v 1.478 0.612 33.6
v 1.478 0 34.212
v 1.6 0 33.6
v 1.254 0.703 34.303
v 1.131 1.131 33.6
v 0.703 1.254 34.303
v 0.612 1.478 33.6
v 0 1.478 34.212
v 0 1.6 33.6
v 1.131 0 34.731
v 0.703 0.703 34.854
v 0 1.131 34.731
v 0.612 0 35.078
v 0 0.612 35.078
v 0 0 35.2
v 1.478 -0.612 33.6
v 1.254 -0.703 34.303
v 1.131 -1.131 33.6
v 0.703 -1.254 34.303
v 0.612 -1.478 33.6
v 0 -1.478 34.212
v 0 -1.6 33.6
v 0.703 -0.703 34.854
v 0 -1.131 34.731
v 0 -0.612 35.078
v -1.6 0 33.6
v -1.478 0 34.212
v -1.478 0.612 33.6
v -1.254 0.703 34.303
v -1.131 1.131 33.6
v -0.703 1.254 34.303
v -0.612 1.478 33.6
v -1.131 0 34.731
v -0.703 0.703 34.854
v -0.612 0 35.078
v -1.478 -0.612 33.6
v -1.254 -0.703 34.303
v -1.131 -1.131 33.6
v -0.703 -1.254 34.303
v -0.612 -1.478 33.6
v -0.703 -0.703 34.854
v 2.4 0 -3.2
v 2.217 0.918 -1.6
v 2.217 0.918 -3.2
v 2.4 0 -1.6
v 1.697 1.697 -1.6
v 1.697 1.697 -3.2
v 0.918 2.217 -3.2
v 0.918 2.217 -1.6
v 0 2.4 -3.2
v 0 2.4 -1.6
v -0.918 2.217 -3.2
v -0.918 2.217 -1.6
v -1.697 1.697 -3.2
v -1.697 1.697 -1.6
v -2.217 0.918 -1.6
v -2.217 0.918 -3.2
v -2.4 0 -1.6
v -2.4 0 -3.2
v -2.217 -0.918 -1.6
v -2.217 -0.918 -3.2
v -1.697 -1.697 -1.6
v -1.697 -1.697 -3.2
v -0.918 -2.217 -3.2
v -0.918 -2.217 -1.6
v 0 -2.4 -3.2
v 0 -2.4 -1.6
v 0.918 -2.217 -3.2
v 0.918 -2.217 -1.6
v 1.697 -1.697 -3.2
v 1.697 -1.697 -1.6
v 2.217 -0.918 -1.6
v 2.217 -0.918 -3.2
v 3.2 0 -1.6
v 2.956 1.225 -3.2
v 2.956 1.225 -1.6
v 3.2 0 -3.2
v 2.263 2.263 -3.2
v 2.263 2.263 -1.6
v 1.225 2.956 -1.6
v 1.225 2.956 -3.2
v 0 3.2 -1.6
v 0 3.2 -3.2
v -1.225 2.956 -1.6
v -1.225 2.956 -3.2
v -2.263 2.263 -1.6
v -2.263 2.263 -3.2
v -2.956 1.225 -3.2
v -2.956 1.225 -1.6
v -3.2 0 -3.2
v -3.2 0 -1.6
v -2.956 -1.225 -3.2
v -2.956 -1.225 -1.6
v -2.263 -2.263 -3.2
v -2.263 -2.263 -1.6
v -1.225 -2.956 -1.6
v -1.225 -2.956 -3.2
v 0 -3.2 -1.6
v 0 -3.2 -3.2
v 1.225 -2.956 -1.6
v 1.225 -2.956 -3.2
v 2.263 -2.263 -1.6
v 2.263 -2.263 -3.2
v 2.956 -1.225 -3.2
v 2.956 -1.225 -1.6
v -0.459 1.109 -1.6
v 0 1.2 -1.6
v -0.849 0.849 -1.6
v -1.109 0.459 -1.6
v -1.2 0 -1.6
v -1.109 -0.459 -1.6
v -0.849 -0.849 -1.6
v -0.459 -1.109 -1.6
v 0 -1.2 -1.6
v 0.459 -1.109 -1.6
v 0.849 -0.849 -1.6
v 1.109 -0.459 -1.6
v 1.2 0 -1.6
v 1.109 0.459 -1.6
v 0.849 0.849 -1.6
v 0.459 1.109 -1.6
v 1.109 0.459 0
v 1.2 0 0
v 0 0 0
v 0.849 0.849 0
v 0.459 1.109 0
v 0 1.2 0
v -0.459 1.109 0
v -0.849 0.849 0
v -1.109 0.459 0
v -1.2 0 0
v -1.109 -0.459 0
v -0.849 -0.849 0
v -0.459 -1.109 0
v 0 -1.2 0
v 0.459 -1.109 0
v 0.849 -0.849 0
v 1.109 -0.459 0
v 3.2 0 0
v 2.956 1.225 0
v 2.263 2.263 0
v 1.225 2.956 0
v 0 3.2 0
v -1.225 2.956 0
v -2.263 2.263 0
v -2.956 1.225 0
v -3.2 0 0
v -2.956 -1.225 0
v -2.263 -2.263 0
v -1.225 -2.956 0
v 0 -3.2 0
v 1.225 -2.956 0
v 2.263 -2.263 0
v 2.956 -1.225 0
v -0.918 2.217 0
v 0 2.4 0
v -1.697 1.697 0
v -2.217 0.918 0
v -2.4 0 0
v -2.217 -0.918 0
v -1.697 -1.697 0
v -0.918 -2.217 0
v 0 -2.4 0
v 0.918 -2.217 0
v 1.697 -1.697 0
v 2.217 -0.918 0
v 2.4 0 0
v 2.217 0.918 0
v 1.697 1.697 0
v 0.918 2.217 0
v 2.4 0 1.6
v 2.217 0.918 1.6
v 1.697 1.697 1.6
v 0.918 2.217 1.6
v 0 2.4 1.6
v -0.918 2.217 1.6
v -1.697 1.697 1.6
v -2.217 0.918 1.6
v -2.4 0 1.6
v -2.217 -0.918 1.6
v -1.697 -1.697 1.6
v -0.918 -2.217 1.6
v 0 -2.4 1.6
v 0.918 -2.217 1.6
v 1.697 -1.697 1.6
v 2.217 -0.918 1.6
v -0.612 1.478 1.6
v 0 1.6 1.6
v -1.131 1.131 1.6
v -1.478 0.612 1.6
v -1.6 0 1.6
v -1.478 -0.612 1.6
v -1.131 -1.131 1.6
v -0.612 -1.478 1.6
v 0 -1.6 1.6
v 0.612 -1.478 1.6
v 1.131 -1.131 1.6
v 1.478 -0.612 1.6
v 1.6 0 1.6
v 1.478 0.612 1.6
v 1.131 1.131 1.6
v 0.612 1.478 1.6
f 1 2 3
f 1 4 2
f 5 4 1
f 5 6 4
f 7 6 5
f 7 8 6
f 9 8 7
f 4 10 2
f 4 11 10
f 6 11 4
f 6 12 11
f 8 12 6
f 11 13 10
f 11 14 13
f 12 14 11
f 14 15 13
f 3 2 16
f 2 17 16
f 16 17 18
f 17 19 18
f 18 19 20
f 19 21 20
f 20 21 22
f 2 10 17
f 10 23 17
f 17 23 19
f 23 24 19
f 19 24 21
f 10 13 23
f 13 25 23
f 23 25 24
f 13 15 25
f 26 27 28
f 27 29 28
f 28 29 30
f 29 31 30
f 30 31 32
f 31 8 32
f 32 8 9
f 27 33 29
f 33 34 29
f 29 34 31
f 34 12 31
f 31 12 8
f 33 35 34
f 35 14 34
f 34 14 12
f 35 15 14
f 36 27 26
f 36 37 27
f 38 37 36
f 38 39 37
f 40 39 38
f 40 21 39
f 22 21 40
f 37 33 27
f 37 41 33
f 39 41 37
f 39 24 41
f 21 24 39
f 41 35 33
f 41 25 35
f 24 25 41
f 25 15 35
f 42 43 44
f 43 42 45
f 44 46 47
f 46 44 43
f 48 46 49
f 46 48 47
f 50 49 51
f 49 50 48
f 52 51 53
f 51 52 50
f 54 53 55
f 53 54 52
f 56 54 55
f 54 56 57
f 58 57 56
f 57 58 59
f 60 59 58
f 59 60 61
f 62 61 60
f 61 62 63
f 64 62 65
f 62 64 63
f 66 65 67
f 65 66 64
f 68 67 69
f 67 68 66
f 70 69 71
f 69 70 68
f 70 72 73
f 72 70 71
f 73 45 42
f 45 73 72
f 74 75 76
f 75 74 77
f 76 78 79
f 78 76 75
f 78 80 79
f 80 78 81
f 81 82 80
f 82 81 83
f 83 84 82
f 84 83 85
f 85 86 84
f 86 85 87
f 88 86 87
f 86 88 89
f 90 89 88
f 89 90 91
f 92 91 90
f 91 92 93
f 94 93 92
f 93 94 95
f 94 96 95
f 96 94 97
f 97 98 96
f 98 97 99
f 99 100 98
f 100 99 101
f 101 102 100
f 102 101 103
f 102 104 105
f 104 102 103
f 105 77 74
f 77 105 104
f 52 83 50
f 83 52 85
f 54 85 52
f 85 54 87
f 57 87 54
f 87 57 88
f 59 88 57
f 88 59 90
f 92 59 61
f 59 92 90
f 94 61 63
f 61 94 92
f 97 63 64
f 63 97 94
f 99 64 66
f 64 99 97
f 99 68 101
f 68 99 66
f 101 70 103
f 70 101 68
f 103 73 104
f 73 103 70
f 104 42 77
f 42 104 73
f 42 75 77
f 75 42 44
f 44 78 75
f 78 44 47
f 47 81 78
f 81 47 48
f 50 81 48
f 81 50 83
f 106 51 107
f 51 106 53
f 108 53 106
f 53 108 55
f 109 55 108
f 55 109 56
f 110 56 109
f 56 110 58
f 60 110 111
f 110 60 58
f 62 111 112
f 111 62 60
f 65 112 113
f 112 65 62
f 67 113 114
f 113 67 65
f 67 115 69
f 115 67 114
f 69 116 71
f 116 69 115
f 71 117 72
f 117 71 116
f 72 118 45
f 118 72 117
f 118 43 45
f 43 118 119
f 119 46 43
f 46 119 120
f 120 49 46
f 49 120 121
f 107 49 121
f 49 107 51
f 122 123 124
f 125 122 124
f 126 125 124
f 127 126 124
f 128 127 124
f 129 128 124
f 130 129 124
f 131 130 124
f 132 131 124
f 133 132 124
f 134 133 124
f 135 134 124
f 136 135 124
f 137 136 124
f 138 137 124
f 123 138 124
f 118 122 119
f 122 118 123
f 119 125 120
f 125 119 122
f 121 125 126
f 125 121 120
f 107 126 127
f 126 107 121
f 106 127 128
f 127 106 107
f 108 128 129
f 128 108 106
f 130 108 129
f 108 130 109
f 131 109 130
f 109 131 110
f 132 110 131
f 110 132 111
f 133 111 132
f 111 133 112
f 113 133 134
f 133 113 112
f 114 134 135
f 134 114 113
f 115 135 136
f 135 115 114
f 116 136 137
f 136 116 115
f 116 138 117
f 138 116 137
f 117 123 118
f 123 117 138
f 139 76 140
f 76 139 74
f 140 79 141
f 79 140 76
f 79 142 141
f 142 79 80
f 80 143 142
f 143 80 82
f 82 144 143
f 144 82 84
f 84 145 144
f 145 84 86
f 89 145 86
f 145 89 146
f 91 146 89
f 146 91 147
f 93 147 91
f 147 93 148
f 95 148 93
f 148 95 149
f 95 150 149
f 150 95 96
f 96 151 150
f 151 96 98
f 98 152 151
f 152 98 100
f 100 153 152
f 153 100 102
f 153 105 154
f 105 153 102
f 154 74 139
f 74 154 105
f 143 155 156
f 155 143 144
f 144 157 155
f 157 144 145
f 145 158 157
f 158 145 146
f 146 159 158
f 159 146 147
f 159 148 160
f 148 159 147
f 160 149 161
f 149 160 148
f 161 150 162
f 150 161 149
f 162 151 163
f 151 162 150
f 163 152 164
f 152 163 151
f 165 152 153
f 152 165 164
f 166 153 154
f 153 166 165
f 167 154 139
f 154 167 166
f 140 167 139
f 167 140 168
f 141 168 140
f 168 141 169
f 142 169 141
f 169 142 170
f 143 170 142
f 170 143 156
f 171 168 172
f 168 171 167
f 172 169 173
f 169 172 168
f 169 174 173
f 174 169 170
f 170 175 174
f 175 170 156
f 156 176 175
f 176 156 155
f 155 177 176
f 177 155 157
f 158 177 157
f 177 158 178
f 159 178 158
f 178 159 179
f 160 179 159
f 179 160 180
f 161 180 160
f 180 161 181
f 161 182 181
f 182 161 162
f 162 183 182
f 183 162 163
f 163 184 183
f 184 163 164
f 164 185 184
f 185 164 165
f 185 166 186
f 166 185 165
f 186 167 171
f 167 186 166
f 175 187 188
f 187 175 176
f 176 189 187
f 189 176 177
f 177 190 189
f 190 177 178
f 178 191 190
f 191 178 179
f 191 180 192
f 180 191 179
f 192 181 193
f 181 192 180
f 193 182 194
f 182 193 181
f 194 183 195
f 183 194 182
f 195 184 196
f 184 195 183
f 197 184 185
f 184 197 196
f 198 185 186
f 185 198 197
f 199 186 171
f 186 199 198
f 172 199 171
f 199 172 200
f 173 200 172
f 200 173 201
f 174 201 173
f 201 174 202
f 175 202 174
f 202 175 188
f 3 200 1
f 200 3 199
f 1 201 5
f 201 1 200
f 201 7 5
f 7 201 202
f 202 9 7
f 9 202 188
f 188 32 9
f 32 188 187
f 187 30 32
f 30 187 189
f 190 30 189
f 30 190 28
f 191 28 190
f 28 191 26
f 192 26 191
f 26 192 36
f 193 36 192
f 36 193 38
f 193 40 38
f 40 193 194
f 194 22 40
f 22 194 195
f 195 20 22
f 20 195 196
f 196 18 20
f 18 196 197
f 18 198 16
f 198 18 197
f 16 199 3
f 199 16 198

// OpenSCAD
// file: ../p/1-8sphe.scad
use <../lib.scad>
function ldraw_lib__1_8sphe() = [
// 0 Sphere 0.125
// 0 Name: 1-8sphe.dat
// 0 Author: James Jessiman
// 0 !LDRAW_ORG Primitive UPDATE 2012-03
// 0 !LICENSE Licensed under CC BY 2.0 and CC BY 4.0 : see CAreadme.txt
// 
// 0 BFC CERTIFY CCW
  [0,"BFC","CERTIFY"],
  [0,"BFC","CCW"],
// 
// 0 !HISTORY 2000-08-01 {Axel Poque} fixes to resolve L3P error messages.
// 0 !HISTORY 2000-08-01 {Manfred Moolhuysen} fixes to resolve L3P error messages.
// 0 !HISTORY 2000-09-30 [PTadmin] Official Update 2000-02
// 0 !HISTORY 2002-03-28 [hafhead] Made BFC compliant
// 0 !HISTORY 2002-04-25 [PTadmin] Official Update 2002-02
// 0 !HISTORY 2007-06-22 [PTadmin] Header formatted for Contributor Agreement
// 0 !HISTORY 2008-07-01 [PTadmin] Official Update 2008-01
// 0 !HISTORY 2010-09-12 [MagFors] Changed winding, removed duplicated cond-line, optimized filesize
// 0 !HISTORY 2010-12-31 [PTadmin] Official Update 2010-03
// 0 !HISTORY 2012-07-01 [tcobbs] Replaced with geometry from LDView
// 0 !HISTORY 2012-12-28 [PTadmin] Official Update 2012-03
// 
// 
// 3 16 1 0 0 0.9239 0.3827 0 0.9239 0 0.3827
  [3,16,1,0,0,0.9239,0.3827,0,0.9239,0,0.3827],
// 3 16 0.9239 0.3827 0 0.7836 0.4393 0.4393 0.9239 0 0.3827
  [3,16,0.9239,0.3827,0,0.7836,0.4393,0.4393,0.9239,0,0.3827],
// 3 16 0.9239 0 0.3827 0.7836 0.4393 0.4393 0.7071 0 0.7071
  [3,16,0.9239,0,0.3827,0.7836,0.4393,0.4393,0.7071,0,0.7071],
// 3 16 0.7836 0.4393 0.4393 0.4393 0.4393 0.7836 0.7071 0 0.7071
  [3,16,0.7836,0.4393,0.4393,0.4393,0.4393,0.7836,0.7071,0,0.7071],
// 3 16 0.7071 0 0.7071 0.4393 0.4393 0.7836 0.3827 0 0.9239
  [3,16,0.7071,0,0.7071,0.4393,0.4393,0.7836,0.3827,0,0.9239],
// 3 16 0.4393 0.4393 0.7836 0 0.3827 0.9239 0.3827 0 0.9239
  [3,16,0.4393,0.4393,0.7836,0,0.3827,0.9239,0.3827,0,0.9239],
// 3 16 0.3827 0 0.9239 0 0.3827 0.9239 0 0 1
  [3,16,0.3827,0,0.9239,0,0.3827,0.9239,0,0,1],
// 3 16 0.9239 0.3827 0 0.7071 0.7071 0 0.7836 0.4393 0.4393
  [3,16,0.9239,0.3827,0,0.7071,0.7071,0,0.7836,0.4393,0.4393],
// 3 16 0.7071 0.7071 0 0.4393 0.7836 0.4393 0.7836 0.4393 0.4393
  [3,16,0.7071,0.7071,0,0.4393,0.7836,0.4393,0.7836,0.4393,0.4393],
// 3 16 0.7836 0.4393 0.4393 0.4393 0.7836 0.4393 0.4393 0.4393 0.7836
  [3,16,0.7836,0.4393,0.4393,0.4393,0.7836,0.4393,0.4393,0.4393,0.7836],
// 3 16 0.4393 0.7836 0.4393 0 0.7071 0.7071 0.4393 0.4393 0.7836
  [3,16,0.4393,0.7836,0.4393,0,0.7071,0.7071,0.4393,0.4393,0.7836],
// 3 16 0.4393 0.4393 0.7836 0 0.7071 0.7071 0 0.3827 0.9239
  [3,16,0.4393,0.4393,0.7836,0,0.7071,0.7071,0,0.3827,0.9239],
// 3 16 0.7071 0.7071 0 0.3827 0.9239 0 0.4393 0.7836 0.4393
  [3,16,0.7071,0.7071,0,0.3827,0.9239,0,0.4393,0.7836,0.4393],
// 3 16 0.3827 0.9239 0 0 0.9239 0.3827 0.4393 0.7836 0.4393
  [3,16,0.3827,0.9239,0,0,0.9239,0.3827,0.4393,0.7836,0.4393],
// 3 16 0.4393 0.7836 0.4393 0 0.9239 0.3827 0 0.7071 0.7071
  [3,16,0.4393,0.7836,0.4393,0,0.9239,0.3827,0,0.7071,0.7071],
// 3 16 0.3827 0.9239 0 0 1 0 0 0.9239 0.3827
  [3,16,0.3827,0.9239,0,0,1,0,0,0.9239,0.3827],
// 
// 5 24 1 0 0 0.9239 0.3827 0 1 0 -0.1 0.9239 0 0.3827
  [5,24,1,0,0,0.9239,0.3827,0,1,0,-0.1,0.9239,0,0.3827],
// 5 24 0.9239 0.3827 0 0.9239 0 0.3827 1 0 0 0.7836 0.4393 0.4393
  [5,24,0.9239,0.3827,0,0.9239,0,0.3827,1,0,0,0.7836,0.4393,0.4393],
// 5 24 1 0 0 0.9239 0 0.3827 0.9239 0.3827 0 1 -0.1 0
  [5,24,1,0,0,0.9239,0,0.3827,0.9239,0.3827,0,1,-0.1,0],
// 5 24 0.9239 0 0.3827 0.7836 0.4393 0.4393 0.9239 0.3827 0 0.7071 0 0.7071
  [5,24,0.9239,0,0.3827,0.7836,0.4393,0.4393,0.9239,0.3827,0,0.7071,0,0.7071],
// 5 24 0.7836 0.4393 0.4393 0.7071 0 0.7071 0.9239 0 0.3827 0.4393 0.4393 0.7836
  [5,24,0.7836,0.4393,0.4393,0.7071,0,0.7071,0.9239,0,0.3827,0.4393,0.4393,0.7836],
// 5 24 0.9239 0 0.3827 0.7071 0 0.7071 0.7836 0.4393 0.4393 0.9239 -0.1 0.3827
  [5,24,0.9239,0,0.3827,0.7071,0,0.7071,0.7836,0.4393,0.4393,0.9239,-0.1,0.3827],
// 5 24 0.7071 0 0.7071 0.4393 0.4393 0.7836 0.7836 0.4393 0.4393 0.3827 0 0.9239
  [5,24,0.7071,0,0.7071,0.4393,0.4393,0.7836,0.7836,0.4393,0.4393,0.3827,0,0.9239],
// 5 24 0.4393 0.4393 0.7836 0.3827 0 0.9239 0.7071 0 0.7071 0 0.3827 0.9239
  [5,24,0.4393,0.4393,0.7836,0.3827,0,0.9239,0.7071,0,0.7071,0,0.3827,0.9239],
// 5 24 0.7071 0 0.7071 0.3827 0 0.9239 0.4393 0.4393 0.7836 0.7071 -0.1 0.7071
  [5,24,0.7071,0,0.7071,0.3827,0,0.9239,0.4393,0.4393,0.7836,0.7071,-0.1,0.7071],
// 5 24 0.3827 0 0.9239 0 0.3827 0.9239 0.4393 0.4393 0.7836 0 0 1
  [5,24,0.3827,0,0.9239,0,0.3827,0.9239,0.4393,0.4393,0.7836,0,0,1],
// 5 24 0 0.3827 0.9239 0 0 1 0.3827 0 0.9239 -0.1 0.3827 0.9239
  [5,24,0,0.3827,0.9239,0,0,1,0.3827,0,0.9239,-0.1,0.3827,0.9239],
// 5 24 0.3827 0 0.9239 0 0 1 0 0.3827 0.9239 0.3827 -0.1 0.9239
  [5,24,0.3827,0,0.9239,0,0,1,0,0.3827,0.9239,0.3827,-0.1,0.9239],
// 5 24 0.9239 0.3827 0 0.7071 0.7071 0 0.9239 0.3827 -0.1 0.7836 0.4393 0.4393
  [5,24,0.9239,0.3827,0,0.7071,0.7071,0,0.9239,0.3827,-0.1,0.7836,0.4393,0.4393],
// 5 24 0.7071 0.7071 0 0.7836 0.4393 0.4393 0.9239 0.3827 0 0.4393 0.7836 0.4393
  [5,24,0.7071,0.7071,0,0.7836,0.4393,0.4393,0.9239,0.3827,0,0.4393,0.7836,0.4393],
// 5 24 0.9239 0.3827 0 0.7836 0.4393 0.4393 0.7071 0.7071 0 0.9239 0 0.3827
  [5,24,0.9239,0.3827,0,0.7836,0.4393,0.4393,0.7071,0.7071,0,0.9239,0,0.3827],
// 5 24 0.7836 0.4393 0.4393 0.4393 0.7836 0.4393 0.7071 0.7071 0 0.4393 0.4393 0.7836
  [5,24,0.7836,0.4393,0.4393,0.4393,0.7836,0.4393,0.7071,0.7071,0,0.4393,0.4393,0.7836],
// 5 24 0.4393 0.7836 0.4393 0.4393 0.4393 0.7836 0.7836 0.4393 0.4393 0 0.7071 0.7071
  [5,24,0.4393,0.7836,0.4393,0.4393,0.4393,0.7836,0.7836,0.4393,0.4393,0,0.7071,0.7071],
// 5 24 0.7836 0.4393 0.4393 0.4393 0.4393 0.7836 0.4393 0.7836 0.4393 0.7071 0 0.7071
  [5,24,0.7836,0.4393,0.4393,0.4393,0.4393,0.7836,0.4393,0.7836,0.4393,0.7071,0,0.7071],
// 5 24 0.4393 0.4393 0.7836 0 0.7071 0.7071 0.4393 0.7836 0.4393 0 0.3827 0.9239
  [5,24,0.4393,0.4393,0.7836,0,0.7071,0.7071,0.4393,0.7836,0.4393,0,0.3827,0.9239],
// 5 24 0 0.7071 0.7071 0 0.3827 0.9239 0.4393 0.4393 0.7836 -0.1 0.7071 0.7071
  [5,24,0,0.7071,0.7071,0,0.3827,0.9239,0.4393,0.4393,0.7836,-0.1,0.7071,0.7071],
// 5 24 0.4393 0.4393 0.7836 0 0.3827 0.9239 0 0.7071 0.7071 0.3827 0 0.9239
  [5,24,0.4393,0.4393,0.7836,0,0.3827,0.9239,0,0.7071,0.7071,0.3827,0,0.9239],
// 5 24 0.7071 0.7071 0 0.3827 0.9239 0 0.7071 0.7071 -0.1 0.4393 0.7836 0.4393
  [5,24,0.7071,0.7071,0,0.3827,0.9239,0,0.7071,0.7071,-0.1,0.4393,0.7836,0.4393],
// 5 24 0.3827 0.9239 0 0.4393 0.7836 0.4393 0.7071 0.7071 0 0 0.9239 0.3827
  [5,24,0.3827,0.9239,0,0.4393,0.7836,0.4393,0.7071,0.7071,0,0,0.9239,0.3827],
// 5 24 0.7071 0.7071 0 0.4393 0.7836 0.4393 0.3827 0.9239 0 0.7836 0.4393 0.4393
  [5,24,0.7071,0.7071,0,0.4393,0.7836,0.4393,0.3827,0.9239,0,0.7836,0.4393,0.4393],
// 5 24 0.4393 0.7836 0.4393 0 0.9239 0.3827 0.3827 0.9239 0 0 0.7071 0.7071
  [5,24,0.4393,0.7836,0.4393,0,0.9239,0.3827,0.3827,0.9239,0,0,0.7071,0.7071],
// 5 24 0 0.9239 0.3827 0 0.7071 0.7071 0.4393 0.7836 0.4393 -0.1 0.9239 0.3827
  [5,24,0,0.9239,0.3827,0,0.7071,0.7071,0.4393,0.7836,0.4393,-0.1,0.9239,0.3827],
// 5 24 0.4393 0.7836 0.4393 0 0.7071 0.7071 0 0.9239 0.3827 0.4393 0.4393 0.7836
  [5,24,0.4393,0.7836,0.4393,0,0.7071,0.7071,0,0.9239,0.3827,0.4393,0.4393,0.7836],
// 5 24 0.3827 0.9239 0 0 1 0 0.3827 0.9239 -0.1 0 0.9239 0.3827
  [5,24,0.3827,0.9239,0,0,1,0,0.3827,0.9239,-0.1,0,0.9239,0.3827],
// 5 24 0 1 0 0 0.9239 0.3827 0.3827 0.9239 0 -0.1 1 0
  [5,24,0,1,0,0,0.9239,0.3827,0.3827,0.9239,0,-0.1,1,0],
// 5 24 0.3827 0.9239 0 0 0.9239 0.3827 0 1 0 0.4393 0.7836 0.4393
  [5,24,0.3827,0.9239,0,0,0.9239,0.3827,0,1,0,0.4393,0.7836,0.4393],
];
makepoly(ldraw_lib__1_8sphe(), line=0.2);
// file: ../p/4-4disc.scad
use <../lib.scad>
function ldraw_lib__4_4disc() = [
// 0 Disc 1.0
// 0 Name: 4-4disc.dat
// 0 Author: James Jessiman
// 0 !LDRAW_ORG Primitive UPDATE 2002-02
// 0 !LICENSE Licensed under CC BY 2.0 and CC BY 4.0 : see CAreadme.txt
// 
// 0 BFC CERTIFY CCW
  [0,"BFC","CERTIFY"],
  [0,"BFC","CCW"],
// 
// 0 !HISTORY 1998-12-15 [PTadmin] Official Update 1998-10
// 0 !HISTORY 2002-03-23 [sbliss] Added BFC statement
// 0 !HISTORY 2002-04-25 [PTadmin] Official Update 2002-02
// 0 !HISTORY 2007-06-24 [PTadmin] Header formatted for Contributor Agreement
// 0 !HISTORY 2008-07-01 [PTadmin] Official Update 2008-01
// 
// 
// 3 16 0 0 0 1 0 0 0.9239 0 0.3827
  [3,16,0,0,0,1,0,0,0.9239,0,0.3827],
// 3 16 0 0 0 0.9239 0 0.3827 0.7071 0 0.7071
  [3,16,0,0,0,0.9239,0,0.3827,0.7071,0,0.7071],
// 3 16 0 0 0 0.7071 0 0.7071 0.3827 0 0.9239
  [3,16,0,0,0,0.7071,0,0.7071,0.3827,0,0.9239],
// 3 16 0 0 0 0.3827 0 0.9239 0 0 1
  [3,16,0,0,0,0.3827,0,0.9239,0,0,1],
// 3 16 0 0 0 0 0 1 -0.3827 0 0.9239
  [3,16,0,0,0,0,0,1,-0.3827,0,0.9239],
// 3 16 0 0 0 -0.3827 0 0.9239 -0.7071 0 0.7071
  [3,16,0,0,0,-0.3827,0,0.9239,-0.7071,0,0.7071],
// 3 16 0 0 0 -0.7071 0 0.7071 -0.9239 0 0.3827
  [3,16,0,0,0,-0.7071,0,0.7071,-0.9239,0,0.3827],
// 3 16 0 0 0 -0.9239 0 0.3827 -1 0 -0
  [3,16,0,0,0,-0.9239,0,0.3827,-1,0,-0],
// 3 16 0 0 0 -1 0 -0 -0.9239 0 -0.3827
  [3,16,0,0,0,-1,0,-0,-0.9239,0,-0.3827],
// 3 16 0 0 0 -0.9239 0 -0.3827 -0.7071 0 -0.7071
  [3,16,0,0,0,-0.9239,0,-0.3827,-0.7071,0,-0.7071],
// 3 16 0 0 0 -0.7071 0 -0.7071 -0.3827 0 -0.9239
  [3,16,0,0,0,-0.7071,0,-0.7071,-0.3827,0,-0.9239],
// 3 16 0 0 0 -0.3827 0 -0.9239 0 0 -1
  [3,16,0,0,0,-0.3827,0,-0.9239,0,0,-1],
// 3 16 0 0 0 0 0 -1 0.3827 0 -0.9239
  [3,16,0,0,0,0,0,-1,0.3827,0,-0.9239],
// 3 16 0 0 0 0.3827 0 -0.9239 0.7071 0 -0.7071
  [3,16,0,0,0,0.3827,0,-0.9239,0.7071,0,-0.7071],
// 3 16 0 0 0 0.7071 0 -0.7071 0.9239 0 -0.3827
  [3,16,0,0,0,0.7071,0,-0.7071,0.9239,0,-0.3827],
// 3 16 0 0 0 0.9239 0 -0.3827 1 0 0
  [3,16,0,0,0,0.9239,0,-0.3827,1,0,0],
// 0
];
makepoly(ldraw_lib__4_4disc(), line=0.2);
// file: ../p/stud4a.scad
use <../lib.scad>
use <4-4cyli.scad>
use <4-4edge.scad>
use <4-4ring3.scad>
function ldraw_lib__stud4a() = [
// 0 Stud Tube Open without Base Edges
// 0 Name: stud4a.dat
// 0 Author: James Jessiman
// 0 !LDRAW_ORG Primitive UPDATE 2009-02
// 0 !LICENSE Licensed under CC BY 2.0 and CC BY 4.0 : see CAreadme.txt
// 
// 0 BFC CERTIFY CCW
  [0,"BFC","CERTIFY"],
  [0,"BFC","CCW"],
// 
// 0 !HISTORY 1999-07-05 [PTadmin] Official Update 1999-05
// 0 !HISTORY 2002-04-04 [sbliss] Modified for BFC compliance
// 0 !HISTORY 2002-04-25 [PTadmin] Official Update 2002-02
// 0 !HISTORY 2007-06-24 [PTadmin] Header formatted for Contributor Agreement
// 0 !HISTORY 2008-07-01 [PTadmin] Official Update 2008-01
// 0 !HISTORY 2009-06-21 [cwdee] Update ring references to 4-4ring
// 0 !HISTORY 2009-09-03 [PTadmin] Official Update 2009-02
// 
// 
// 1 16 0 -4 0 6 0 0 0 1 0 0 0 6 4-4edge.dat
  [1,16,0,-4,0,6,0,0,0,1,0,0,0,6, ldraw_lib__4_4edge()],
// 1 16 0 -4 0 8 0 0 0 1 0 0 0 8 4-4edge.dat
  [1,16,0,-4,0,8,0,0,0,1,0,0,0,8, ldraw_lib__4_4edge()],
// 0 BFC INVERTNEXT
  [0,"BFC","INVERTNEXT"],
// 1 16 0 -4 0 6 0 0 0 4 0 0 0 6 4-4cyli.dat
  [1,16,0,-4,0,6,0,0,0,4,0,0,0,6, ldraw_lib__4_4cyli()],
// 1 16 0 -4 0 8 0 0 0 4 0 0 0 8 4-4cyli.dat
  [1,16,0,-4,0,8,0,0,0,4,0,0,0,8, ldraw_lib__4_4cyli()],
// 1 16 0 -4 0 2 0 0 0 1 0 0 0 2 4-4ring3.dat
  [1,16,0,-4,0,2,0,0,0,1,0,0,0,2, ldraw_lib__4_4ring3()],
// 0
];
makepoly(ldraw_lib__stud4a(), line=0.2);
// file: ../p/4-8sphe.scad
use <../lib.scad>
use <1-8sphe.scad>
function ldraw_lib__4_8sphe() = [
// 0 Sphere 0.5
// 0 Name: 4-8sphe.dat
// 0 Author: James Jessiman
// 0 !LDRAW_ORG Primitive UPDATE 2003-02
// 0 !LICENSE Licensed under CC BY 2.0 and CC BY 4.0 : see CAreadme.txt
// 
// 0 BFC CERTIFY CCW
  [0,"BFC","CERTIFY"],
  [0,"BFC","CCW"],
// 
// 0 !HISTORY 2002-08-31 [izanette] Modified with WINDZ for BFC compliance
// 0 !HISTORY 2003-08-01 [PTadmin] Official Update 2003-02
// 0 !HISTORY 2007-06-24 [PTadmin] Header formatted for Contributor Agreement
// 0 !HISTORY 2008-07-01 [PTadmin] Official Update 2008-01
// 
// 
// 1 16 0 0 0 1 0 0 0 1 0 0 0 1 1-8sphe.dat
  [1,16,0,0,0,1,0,0,0,1,0,0,0,1, ldraw_lib__1_8sphe()],
// 1 16 0 0 0 1 0 0 0 1 0 0 0 -1 1-8sphe.dat
  [1,16,0,0,0,1,0,0,0,1,0,0,0,-1, ldraw_lib__1_8sphe()],
// 1 16 0 0 0 -1 0 0 0 1 0 0 0 1 1-8sphe.dat
  [1,16,0,0,0,-1,0,0,0,1,0,0,0,1, ldraw_lib__1_8sphe()],
// 1 16 0 0 0 -1 0 0 0 1 0 0 0 -1 1-8sphe.dat
  [1,16,0,0,0,-1,0,0,0,1,0,0,0,-1, ldraw_lib__1_8sphe()],
// 0
// 
];
makepoly(ldraw_lib__4_8sphe(), line=0.2);
// file: ../p/4-4ring3.scad
use <../lib.scad>
function ldraw_lib__4_4ring3() = [
// 0 Ring  3 x 1.0
// 0 Name: 4-4ring3.dat
// 0 Author: James Jessiman
// 0 !LDRAW_ORG Primitive UPDATE 2009-01
// 0 !LICENSE Licensed under CC BY 2.0 and CC BY 4.0 : see CAreadme.txt
// 
// 0 BFC CERTIFY CCW
  [0,"BFC","CERTIFY"],
  [0,"BFC","CCW"],
// 
// 0 !HISTORY 1998-12-15 [PTadmin] Official Update 1998-10
// 0 !HISTORY 2002-04-05 [hafhead] Added BFC statement
// 0 !HISTORY 2002-04-25 [PTadmin] Official Update 2002-02
// 0 !HISTORY 2007-06-24 [PTadmin] Header formatted for Contributor Agreement
// 0 !HISTORY 2008-07-01 [PTadmin] Official Update 2008-01
// 0 !HISTORY 2008-08-26 [cwdee] Switch polygon winding and rename
// 0 !HISTORY 2009-05-02 [PTadmin] Official Update 2009-01
// 
// 
// 4 16 -1.5308 0 3.6956 -1.1481 0 2.7717 0 0 3 0 0 4
  [4,16,-1.5308,0,3.6956,-1.1481,0,2.7717,0,0,3,0,0,4],
// 4 16 -2.8284 0 2.8284 -2.1213 0 2.1213 -1.1481 0 2.7717 -1.5308 0 3.6956
  [4,16,-2.8284,0,2.8284,-2.1213,0,2.1213,-1.1481,0,2.7717,-1.5308,0,3.6956],
// 4 16 -3.6956 0 1.5308 -2.7717 0 1.1481 -2.1213 0 2.1213 -2.8284 0 2.8284
  [4,16,-3.6956,0,1.5308,-2.7717,0,1.1481,-2.1213,0,2.1213,-2.8284,0,2.8284],
// 4 16 -4 0 0 -3 0 0 -2.7717 0 1.1481 -3.6956 0 1.5308
  [4,16,-4,0,0,-3,0,0,-2.7717,0,1.1481,-3.6956,0,1.5308],
// 4 16 -3.6956 0 -1.5308 -2.7717 0 -1.1481 -3 0 0 -4 0 0
  [4,16,-3.6956,0,-1.5308,-2.7717,0,-1.1481,-3,0,0,-4,0,0],
// 4 16 -2.8284 0 -2.8284 -2.1213 0 -2.1213 -2.7717 0 -1.1481 -3.6956 0 -1.5308
  [4,16,-2.8284,0,-2.8284,-2.1213,0,-2.1213,-2.7717,0,-1.1481,-3.6956,0,-1.5308],
// 4 16 -1.5308 0 -3.6956 -1.1481 0 -2.7717 -2.1213 0 -2.1213 -2.8284 0 -2.8284
  [4,16,-1.5308,0,-3.6956,-1.1481,0,-2.7717,-2.1213,0,-2.1213,-2.8284,0,-2.8284],
// 4 16 0 0 -4 0 0 -3 -1.1481 0 -2.7717 -1.5308 0 -3.6956
  [4,16,0,0,-4,0,0,-3,-1.1481,0,-2.7717,-1.5308,0,-3.6956],
// 4 16 1.5308 0 -3.6956 1.1481 0 -2.7717 0 0 -3 0 0 -4
  [4,16,1.5308,0,-3.6956,1.1481,0,-2.7717,0,0,-3,0,0,-4],
// 4 16 2.8284 0 -2.8284 2.1213 0 -2.1213 1.1481 0 -2.7717 1.5308 0 -3.6956
  [4,16,2.8284,0,-2.8284,2.1213,0,-2.1213,1.1481,0,-2.7717,1.5308,0,-3.6956],
// 4 16 3.6956 0 -1.5308 2.7717 0 -1.1481 2.1213 0 -2.1213 2.8284 0 -2.8284
  [4,16,3.6956,0,-1.5308,2.7717,0,-1.1481,2.1213,0,-2.1213,2.8284,0,-2.8284],
// 4 16 4 0 0 3 0 0 2.7717 0 -1.1481 3.6956 0 -1.5308
  [4,16,4,0,0,3,0,0,2.7717,0,-1.1481,3.6956,0,-1.5308],
// 4 16 3.6956 0 1.5308 2.7717 0 1.1481 3 0 0 4 0 0
  [4,16,3.6956,0,1.5308,2.7717,0,1.1481,3,0,0,4,0,0],
// 4 16 2.8284 0 2.8284 2.1213 0 2.1213 2.7717 0 1.1481 3.6956 0 1.5308
  [4,16,2.8284,0,2.8284,2.1213,0,2.1213,2.7717,0,1.1481,3.6956,0,1.5308],
// 4 16 1.5308 0 3.6956 1.1481 0 2.7717 2.1213 0 2.1213 2.8284 0 2.8284
  [4,16,1.5308,0,3.6956,1.1481,0,2.7717,2.1213,0,2.1213,2.8284,0,2.8284],
// 4 16 0 0 4 0 0 3 1.1481 0 2.7717 1.5308 0 3.6956
  [4,16,0,0,4,0,0,3,1.1481,0,2.7717,1.5308,0,3.6956],
// 0
];
makepoly(ldraw_lib__4_4ring3(), line=0.2);
// file: ../p/4-4ring2.scad
use <../lib.scad>
function ldraw_lib__4_4ring2() = [
// 0 Ring  2 x 1.0
// 0 Name: 4-4ring2.dat
// 0 Author: James Jessiman
// 0 !LDRAW_ORG Primitive UPDATE 2009-01
// 0 !LICENSE Licensed under CC BY 2.0 and CC BY 4.0 : see CAreadme.txt
// 
// 0 BFC CERTIFY CCW
  [0,"BFC","CERTIFY"],
  [0,"BFC","CCW"],
// 
// 0 !HISTORY 1998-12-15 [PTadmin] Official Update 1998-10
// 0 !HISTORY 2002-04-05 [hafhead] Added BFC statement
// 0 !HISTORY 2002-04-25 [PTadmin] Official Update 2002-02
// 0 !HISTORY 2007-06-24 [PTadmin] Header formatted for Contributor Agreement
// 0 !HISTORY 2008-07-01 [PTadmin] Official Update 2008-01
// 0 !HISTORY 2008-08-26 [cwdee] Switch polygon winding and rename
// 0 !HISTORY 2009-05-02 [PTadmin] Official Update 2009-01
// 
// 
// 4 16 -1.1481 0 2.7717 -0.7654 0 1.8478 0 0 2 0 0 3
  [4,16,-1.1481,0,2.7717,-0.7654,0,1.8478,0,0,2,0,0,3],
// 4 16 -2.1213 0 2.1213 -1.4142 0 1.4142 -0.7654 0 1.8478 -1.1481 0 2.7717
  [4,16,-2.1213,0,2.1213,-1.4142,0,1.4142,-0.7654,0,1.8478,-1.1481,0,2.7717],
// 4 16 -2.7717 0 1.1481 -1.8478 0 0.7654 -1.4142 0 1.4142 -2.1213 0 2.1213
  [4,16,-2.7717,0,1.1481,-1.8478,0,0.7654,-1.4142,0,1.4142,-2.1213,0,2.1213],
// 4 16 -3 0 0 -2 0 0 -1.8478 0 0.7654 -2.7717 0 1.1481
  [4,16,-3,0,0,-2,0,0,-1.8478,0,0.7654,-2.7717,0,1.1481],
// 4 16 -2.7717 0 -1.1481 -1.8478 0 -0.7654 -2 0 0 -3 0 0
  [4,16,-2.7717,0,-1.1481,-1.8478,0,-0.7654,-2,0,0,-3,0,0],
// 4 16 -2.1213 0 -2.1213 -1.4142 0 -1.4142 -1.8478 0 -0.7654 -2.7717 0 -1.1481
  [4,16,-2.1213,0,-2.1213,-1.4142,0,-1.4142,-1.8478,0,-0.7654,-2.7717,0,-1.1481],
// 4 16 -1.1481 0 -2.7717 -0.7654 0 -1.8478 -1.4142 0 -1.4142 -2.1213 0 -2.1213
  [4,16,-1.1481,0,-2.7717,-0.7654,0,-1.8478,-1.4142,0,-1.4142,-2.1213,0,-2.1213],
// 4 16 0 0 -3 0 0 -2 -0.7654 0 -1.8478 -1.1481 0 -2.7717
  [4,16,0,0,-3,0,0,-2,-0.7654,0,-1.8478,-1.1481,0,-2.7717],
// 4 16 1.1481 0 -2.7717 0.7654 0 -1.8478 0 0 -2 0 0 -3
  [4,16,1.1481,0,-2.7717,0.7654,0,-1.8478,0,0,-2,0,0,-3],
// 4 16 2.1213 0 -2.1213 1.4142 0 -1.4142 0.7654 0 -1.8478 1.1481 0 -2.7717
  [4,16,2.1213,0,-2.1213,1.4142,0,-1.4142,0.7654,0,-1.8478,1.1481,0,-2.7717],
// 4 16 2.7717 0 -1.1481 1.8478 0 -0.7654 1.4142 0 -1.4142 2.1213 0 -2.1213
  [4,16,2.7717,0,-1.1481,1.8478,0,-0.7654,1.4142,0,-1.4142,2.1213,0,-2.1213],
// 4 16 3 0 0 2 0 0 1.8478 0 -0.7654 2.7717 0 -1.1481
  [4,16,3,0,0,2,0,0,1.8478,0,-0.7654,2.7717,0,-1.1481],
// 4 16 2.7717 0 1.1481 1.8478 0 0.7654 2 0 0 3 0 0
  [4,16,2.7717,0,1.1481,1.8478,0,0.7654,2,0,0,3,0,0],
// 4 16 2.1213 0 2.1213 1.4142 0 1.4142 1.8478 0 0.7654 2.7717 0 1.1481
  [4,16,2.1213,0,2.1213,1.4142,0,1.4142,1.8478,0,0.7654,2.7717,0,1.1481],
// 4 16 1.1481 0 2.7717 0.7654 0 1.8478 1.4142 0 1.4142 2.1213 0 2.1213
  [4,16,1.1481,0,2.7717,0.7654,0,1.8478,1.4142,0,1.4142,2.1213,0,2.1213],
// 4 16 0 0 3 0 0 2 0.7654 0 1.8478 1.1481 0 2.7717
  [4,16,0,0,3,0,0,2,0.7654,0,1.8478,1.1481,0,2.7717],
// 0
];
makepoly(ldraw_lib__4_4ring2(), line=0.2);
// file: ../p/4-4ring1.scad
use <../lib.scad>
function ldraw_lib__4_4ring1() = [
// 0 Ring  1 x 1.0
// 0 Name: 4-4ring1.dat
// 0 Author: James Jessiman
// 0 !LDRAW_ORG Primitive UPDATE 2009-01
// 0 !LICENSE Licensed under CC BY 2.0 and CC BY 4.0 : see CAreadme.txt
// 
// 0 BFC CERTIFY CCW
  [0,"BFC","CERTIFY"],
  [0,"BFC","CCW"],
// 
// 0 !HISTORY 1998-12-15 [PTadmin] Official Update 1998-10
// 0 !HISTORY 2002-04-08 [BrickCaster] Modified for BFC compliance
// 0 !HISTORY 2002-04-25 [PTadmin] Official Update 2002-02
// 0 !HISTORY 2007-06-24 [PTadmin] Header formatted for Contributor Agreement
// 0 !HISTORY 2008-07-01 [PTadmin] Official Update 2008-01
// 0 !HISTORY 2008-08-26 [cwdee] Switch polygon winding and rename
// 0 !HISTORY 2009-05-02 [PTadmin] Official Update 2009-01
// 
// 
// 4 16 -0.7654 0 1.8478 -0.3827 0 0.9239 0 0 1 0 0 2
  [4,16,-0.7654,0,1.8478,-0.3827,0,0.9239,0,0,1,0,0,2],
// 4 16 -1.4142 0 1.4142 -0.7071 0 0.7071 -0.3827 0 0.9239 -0.7654 0 1.8478
  [4,16,-1.4142,0,1.4142,-0.7071,0,0.7071,-0.3827,0,0.9239,-0.7654,0,1.8478],
// 4 16 -1.8478 0 0.7654 -0.9239 0 0.3827 -0.7071 0 0.7071 -1.4142 0 1.41420
  [4,16,-1.8478,0,0.7654,-0.9239,0,0.3827,-0.7071,0,0.7071,-1.4142,0,1.41420],
// 4 16 -2 0 0 -1 0 0 -0.9239 0 0.3827 -1.8478 0 0.7654
  [4,16,-2,0,0,-1,0,0,-0.9239,0,0.3827,-1.8478,0,0.7654],
// 4 16 -1.8478 0 -0.7654 -0.9239 0 -0.3827 -1 0 0 -2 0 0
  [4,16,-1.8478,0,-0.7654,-0.9239,0,-0.3827,-1,0,0,-2,0,0],
// 4 16 -1.4142 0 -1.4142 -0.7071 0 -0.7071 -0.9239 0 -0.3827 -1.8478 0 -0.7654
  [4,16,-1.4142,0,-1.4142,-0.7071,0,-0.7071,-0.9239,0,-0.3827,-1.8478,0,-0.7654],
// 4 16 -0.7654 0 -1.8478 -0.3827 0 -0.9239 -0.7071 0 -0.7071 -1.4142 0 -1.4142
  [4,16,-0.7654,0,-1.8478,-0.3827,0,-0.9239,-0.7071,0,-0.7071,-1.4142,0,-1.4142],
// 4 16 0 0 -2 0 0 -1 -0.3827 0 -0.9239 -0.7654 0 -1.8478
  [4,16,0,0,-2,0,0,-1,-0.3827,0,-0.9239,-0.7654,0,-1.8478],
// 4 16 0.7654 0 -1.8478 0.3827 0 -0.9239 0 0 -1 0 0 -2
  [4,16,0.7654,0,-1.8478,0.3827,0,-0.9239,0,0,-1,0,0,-2],
// 4 16 1.4142 0 -1.4142 0.7071 0 -0.7071 0.3827 0 -0.9239 0.7654 0 -1.8478
  [4,16,1.4142,0,-1.4142,0.7071,0,-0.7071,0.3827,0,-0.9239,0.7654,0,-1.8478],
// 4 16 1.8478 0 -0.7654 0.9239 0 -0.3827 0.7071 0 -0.7071 1.4142 0 -1.4142
  [4,16,1.8478,0,-0.7654,0.9239,0,-0.3827,0.7071,0,-0.7071,1.4142,0,-1.4142],
// 4 16 2 0 0 1 0 0 0.9239 0 -0.3827 1.8478 0 -0.7654
  [4,16,2,0,0,1,0,0,0.9239,0,-0.3827,1.8478,0,-0.7654],
// 4 16 1.8478 0 0.7654 0.9239 0 0.3827 1 0 0 2 0 0
  [4,16,1.8478,0,0.7654,0.9239,0,0.3827,1,0,0,2,0,0],
// 4 16 1.4142 0 1.4142 0.7071 0 0.7071 0.9239 0 0.3827 1.8478 0 0.7654
  [4,16,1.4142,0,1.4142,0.7071,0,0.7071,0.9239,0,0.3827,1.8478,0,0.7654],
// 4 16 0.7654 0 1.8478 0.3827 0 0.9239 0.7071 0 0.7071 1.4142 0 1.4142
  [4,16,0.7654,0,1.8478,0.3827,0,0.9239,0.7071,0,0.7071,1.4142,0,1.4142],
// 4 16 0 0 2 0 0 1 0.3827 0 0.9239 0.7654 0 1.8478
  [4,16,0,0,2,0,0,1,0.3827,0,0.9239,0.7654,0,1.8478],
// 0
];
makepoly(ldraw_lib__4_4ring1(), line=0.2);
// file: ../p/4-4edge.scad
use <../lib.scad>
function ldraw_lib__4_4edge() = [
// 0 Circle 1.0
// 0 Name: 4-4edge.dat
// 0 Author: James Jessiman
// 0 !LDRAW_ORG Primitive UPDATE 2017-01
// 0 !LICENSE Licensed under CC BY 2.0 and CC BY 4.0 : see CAreadme.txt
// 
// 0 BFC CERTIFY CCW
  [0,"BFC","CERTIFY"],
  [0,"BFC","CCW"],
// 
// 0 !HISTORY 1998-12-15 [PTadmin] Official Update 1998-10
// 0 !HISTORY 2005-12-28 [PTadmin] Official Update 2005-01
// 0 !HISTORY 2007-06-24 [PTadmin] Header formatted for Contributor Agreement
// 0 !HISTORY 2008-07-01 [PTadmin] Official Update 2008-01
// 0 !HISTORY 2017-01-15 [Steffen] BFCed
// 0 !HISTORY 2017-12-30 [PTadmin] Official Update 2017-01
// 
// 
// 2 24 1 0 0 0.9239 0 0.3827
  [2,24,1,0,0,0.9239,0,0.3827],
// 2 24 0.9239 0 0.3827 0.7071 0 0.7071
  [2,24,0.9239,0,0.3827,0.7071,0,0.7071],
// 2 24 0.7071 0 0.7071 0.3827 0 0.9239
  [2,24,0.7071,0,0.7071,0.3827,0,0.9239],
// 2 24 0.3827 0 0.9239 0 0 1
  [2,24,0.3827,0,0.9239,0,0,1],
// 2 24 0 0 1 -0.3827 0 0.9239
  [2,24,0,0,1,-0.3827,0,0.9239],
// 2 24 -0.3827 0 0.9239 -0.7071 0 0.7071
  [2,24,-0.3827,0,0.9239,-0.7071,0,0.7071],
// 2 24 -0.7071 0 0.7071 -0.9239 0 0.3827
  [2,24,-0.7071,0,0.7071,-0.9239,0,0.3827],
// 2 24 -0.9239 0 0.3827 -1 0 -0
  [2,24,-0.9239,0,0.3827,-1,0,-0],
// 2 24 -1 0 -0 -0.9239 0 -0.3827
  [2,24,-1,0,-0,-0.9239,0,-0.3827],
// 2 24 -0.9239 0 -0.3827 -0.7071 0 -0.7071
  [2,24,-0.9239,0,-0.3827,-0.7071,0,-0.7071],
// 2 24 -0.7071 0 -0.7071 -0.3827 0 -0.9239
  [2,24,-0.7071,0,-0.7071,-0.3827,0,-0.9239],
// 2 24 -0.3827 0 -0.9239 0 0 -1
  [2,24,-0.3827,0,-0.9239,0,0,-1],
// 2 24 0 0 -1 0.3827 0 -0.9239
  [2,24,0,0,-1,0.3827,0,-0.9239],
// 2 24 0.3827 0 -0.9239 0.7071 0 -0.7071
  [2,24,0.3827,0,-0.9239,0.7071,0,-0.7071],
// 2 24 0.7071 0 -0.7071 0.9239 0 -0.3827
  [2,24,0.7071,0,-0.7071,0.9239,0,-0.3827],
// 2 24 0.9239 0 -0.3827 1 0 0
  [2,24,0.9239,0,-0.3827,1,0,0],
];
makepoly(ldraw_lib__4_4edge(), line=0.2);
// file: ../p/4-4cylo.scad
use <../lib.scad>
use <4-4cyli.scad>
use <4-4edge.scad>
function ldraw_lib__4_4cylo() = [
// 0 Cylinder Open 1.0
// 0 Name: 4-4cylo.dat
// 0 Author: Mark Kennedy [mkennedy]
// 0 !LDRAW_ORG Primitive UPDATE 2010-01
// 0 !LICENSE Licensed under CC BY 2.0 and CC BY 4.0 : see CAreadme.txt
// 
// 0 BFC CERTIFY CCW
  [0,"BFC","CERTIFY"],
  [0,"BFC","CCW"],
// 
// 0 !HISTORY 2010-04-05 [PTadmin] Official Update 2010-01
// 
// 
// 1 16 0 0 0 1 0 0 0 1 0 0 0 1 4-4edge.dat
  [1,16,0,0,0,1,0,0,0,1,0,0,0,1, ldraw_lib__4_4edge()],
// 1 16 0 1 0 1 0 0 0 1 0 0 0 1 4-4edge.dat
  [1,16,0,1,0,1,0,0,0,1,0,0,0,1, ldraw_lib__4_4edge()],
// 1 16 0 0 0 1 0 0 0 1 0 0 0 1 4-4cyli.dat
  [1,16,0,0,0,1,0,0,0,1,0,0,0,1, ldraw_lib__4_4cyli()],
// 0
];
makepoly(ldraw_lib__4_4cylo(), line=0.2);
// file: ../p/4-4cyli.scad
use <../lib.scad>
function ldraw_lib__4_4cyli() = [
// 0 Cylinder 1.0
// 0 Name: 4-4cyli.dat
// 0 Author: James Jessiman
// 0 !LDRAW_ORG Primitive UPDATE 2005-01
// 0 !LICENSE Licensed under CC BY 2.0 and CC BY 4.0 : see CAreadme.txt
// 
// 0 BFC CERTIFY CCW
  [0,"BFC","CERTIFY"],
  [0,"BFC","CCW"],
// 
// 0 !HISTORY 1998-12-15 [PTadmin] Official Update 1998-10
// 0 !HISTORY 2002-03-23 [sbliss] Added BFC statement; merged headers from files in distributions LDraw 0.27 and Complete.
// 0 !HISTORY 2002-04-25 [PTadmin] Official Update 2002-02
// 0 !HISTORY 2004-12-14 [guyvivan] BFC CCW
// 0 !HISTORY 2005-12-28 [PTadmin] Official Update 2005-01
// 0 !HISTORY 2007-06-24 [PTadmin] Header formatted for Contributor Agreement
// 0 !HISTORY 2008-07-01 [PTadmin] Official Update 2008-01
// 
// 
// 4 16 1 1 0 0.9239 1 0.3827 0.9239 0 0.3827 1 0 0
  [4,16,1,1,0,0.9239,1,0.3827,0.9239,0,0.3827,1,0,0],
// 5 24 1 0 0 1 1 0 0.9239 0 0.3827 0.9239 0 -0.3827
  [5,24,1,0,0,1,1,0,0.9239,0,0.3827,0.9239,0,-0.3827],
// 4 16 0.9239 1 0.3827 0.7071 1 0.7071 0.7071 0 0.7071 0.9239 0 0.3827
  [4,16,0.9239,1,0.3827,0.7071,1,0.7071,0.7071,0,0.7071,0.9239,0,0.3827],
// 5 24 0.9239 0 0.3827 0.9239 1 0.3827 0.7071 0 0.7071 1 0 0
  [5,24,0.9239,0,0.3827,0.9239,1,0.3827,0.7071,0,0.7071,1,0,0],
// 4 16 0.7071 1 0.7071 0.3827 1 0.9239 0.3827 0 0.9239 0.7071 0 0.7071
  [4,16,0.7071,1,0.7071,0.3827,1,0.9239,0.3827,0,0.9239,0.7071,0,0.7071],
// 5 24 0.7071 0 0.7071 0.7071 1 0.7071 0.3827 0 0.9239 0.9239 0 0.3827
  [5,24,0.7071,0,0.7071,0.7071,1,0.7071,0.3827,0,0.9239,0.9239,0,0.3827],
// 4 16 0.3827 1 0.9239 0 1 1 0 0 1 0.3827 0 0.9239
  [4,16,0.3827,1,0.9239,0,1,1,0,0,1,0.3827,0,0.9239],
// 5 24 0.3827 0 0.9239 0.3827 1 0.9239 0 0 1 0.7071 0 0.7071
  [5,24,0.3827,0,0.9239,0.3827,1,0.9239,0,0,1,0.7071,0,0.7071],
// 4 16 0 1 1 -0.3827 1 0.9239 -0.3827 0 0.9239 0 0 1
  [4,16,0,1,1,-0.3827,1,0.9239,-0.3827,0,0.9239,0,0,1],
// 5 24 0 0 1 0 1 1 -0.3827 0 0.9239 0.3827 0 0.9239
  [5,24,0,0,1,0,1,1,-0.3827,0,0.9239,0.3827,0,0.9239],
// 4 16 -0.3827 1 0.9239 -0.7071 1 0.7071 -0.7071 0 0.7071 -0.3827 0 0.9239
  [4,16,-0.3827,1,0.9239,-0.7071,1,0.7071,-0.7071,0,0.7071,-0.3827,0,0.9239],
// 5 24 -0.3827 0 0.9239 -0.3827 1 0.9239 -0.7071 0 0.7071 0 0 1
  [5,24,-0.3827,0,0.9239,-0.3827,1,0.9239,-0.7071,0,0.7071,0,0,1],
// 4 16 -0.7071 1 0.7071 -0.9239 1 0.3827 -0.9239 0 0.3827 -0.7071 0 0.7071
  [4,16,-0.7071,1,0.7071,-0.9239,1,0.3827,-0.9239,0,0.3827,-0.7071,0,0.7071],
// 5 24 -0.7071 0 0.7071 -0.7071 1 0.7071 -0.9239 0 0.3827 -0.3827 0 0.9239
  [5,24,-0.7071,0,0.7071,-0.7071,1,0.7071,-0.9239,0,0.3827,-0.3827,0,0.9239],
// 4 16 -0.9239 1 0.3827 -1 1 0 -1 0 0 -0.9239 0 0.3827
  [4,16,-0.9239,1,0.3827,-1,1,0,-1,0,0,-0.9239,0,0.3827],
// 5 24 -0.9239 0 0.3827 -0.9239 1 0.3827 -1 0 0 -0.7071 0 0.7071
  [5,24,-0.9239,0,0.3827,-0.9239,1,0.3827,-1,0,0,-0.7071,0,0.7071],
// 4 16 -1 1 0 -0.9239 1 -0.3827 -0.9239 0 -0.3827 -1 0 0
  [4,16,-1,1,0,-0.9239,1,-0.3827,-0.9239,0,-0.3827,-1,0,0],
// 5 24 -1 0 0 -1 1 0 -0.9239 0 -0.3827 -0.9239 0 0.3827
  [5,24,-1,0,0,-1,1,0,-0.9239,0,-0.3827,-0.9239,0,0.3827],
// 4 16 -0.9239 1 -0.3827 -0.7071 1 -0.7071 -0.7071 0 -0.7071 -0.9239 0 -0.3827
  [4,16,-0.9239,1,-0.3827,-0.7071,1,-0.7071,-0.7071,0,-0.7071,-0.9239,0,-0.3827],
// 5 24 -0.9239 0 -0.3827 -0.9239 1 -0.3827 -0.7071 0 -0.7071 -1 0 0
  [5,24,-0.9239,0,-0.3827,-0.9239,1,-0.3827,-0.7071,0,-0.7071,-1,0,0],
// 4 16 -0.7071 1 -0.7071 -0.3827 1 -0.9239 -0.3827 0 -0.9239 -0.7071 0 -0.7071
  [4,16,-0.7071,1,-0.7071,-0.3827,1,-0.9239,-0.3827,0,-0.9239,-0.7071,0,-0.7071],
// 5 24 -0.7071 0 -0.7071 -0.7071 1 -0.7071 -0.3827 0 -0.9239 -0.9239 0 -0.3827
  [5,24,-0.7071,0,-0.7071,-0.7071,1,-0.7071,-0.3827,0,-0.9239,-0.9239,0,-0.3827],
// 4 16 -0.3827 1 -0.9239 0 1 -1 0 0 -1 -0.3827 0 -0.9239
  [4,16,-0.3827,1,-0.9239,0,1,-1,0,0,-1,-0.3827,0,-0.9239],
// 5 24 -0.3827 0 -0.9239 -0.3827 1 -0.9239 0 0 -1 -0.7071 0 -0.7071
  [5,24,-0.3827,0,-0.9239,-0.3827,1,-0.9239,0,0,-1,-0.7071,0,-0.7071],
// 4 16 0 1 -1 0.3827 1 -0.9239 0.3827 0 -0.9239 0 0 -1
  [4,16,0,1,-1,0.3827,1,-0.9239,0.3827,0,-0.9239,0,0,-1],
// 5 24 0 0 -1 0 1 -1 0.3827 0 -0.9239 -0.3827 0 -0.9239
  [5,24,0,0,-1,0,1,-1,0.3827,0,-0.9239,-0.3827,0,-0.9239],
// 4 16 0.3827 1 -0.9239 0.7071 1 -0.7071 0.7071 0 -0.7071 0.3827 0 -0.9239
  [4,16,0.3827,1,-0.9239,0.7071,1,-0.7071,0.7071,0,-0.7071,0.3827,0,-0.9239],
// 5 24 0.3827 0 -0.9239 0.3827 1 -0.9239 0.7071 0 -0.7071 0 0 -1
  [5,24,0.3827,0,-0.9239,0.3827,1,-0.9239,0.7071,0,-0.7071,0,0,-1],
// 4 16 0.7071 1 -0.7071 0.9239 1 -0.3827 0.9239 0 -0.3827 0.7071 0 -0.7071
  [4,16,0.7071,1,-0.7071,0.9239,1,-0.3827,0.9239,0,-0.3827,0.7071,0,-0.7071],
// 5 24 0.7071 0 -0.7071 0.7071 1 -0.7071 0.9239 0 -0.3827 0.3827 0 -0.9239
  [5,24,0.7071,0,-0.7071,0.7071,1,-0.7071,0.9239,0,-0.3827,0.3827,0,-0.9239],
// 4 16 0.9239 1 -0.3827 1 1 0 1 0 0 0.9239 0 -0.3827
  [4,16,0.9239,1,-0.3827,1,1,0,1,0,0,0.9239,0,-0.3827],
// 5 24 0.9239 0 -0.3827 0.9239 1 -0.3827 1 0 0 0.7071 0 -0.7071
  [5,24,0.9239,0,-0.3827,0.9239,1,-0.3827,1,0,0,0.7071,0,-0.7071],
// 0
];
makepoly(ldraw_lib__4_4cyli(), line=0.2);
// file: ../p/4-4cylc.scad
use <../lib.scad>
use <4-4cyli.scad>
use <4-4disc.scad>
use <4-4edge.scad>
function ldraw_lib__4_4cylc() = [
// 0 Cylinder Closed 1.0
// 0 Name: 4-4cylc.dat
// 0 Author: Alex Taylor [anathema]
// 0 !LDRAW_ORG Primitive UPDATE 2009-02
// 0 !LICENSE Licensed under CC BY 2.0 and CC BY 4.0 : see CAreadme.txt
// 
// 0 BFC CERTIFY CCW
  [0,"BFC","CERTIFY"],
  [0,"BFC","CCW"],
// 
// 0 !HISTORY 2008-12-29 [cwdee] Removed one disc
// 0 !HISTORY 2009-09-03 [PTadmin] Official Update 2009-02
// 
// 
// 1 16 0 0 0 1 0 0 0 1 0 0 0 1 4-4edge.dat
  [1,16,0,0,0,1,0,0,0,1,0,0,0,1, ldraw_lib__4_4edge()],
// 1 16 0 1 0 1 0 0 0 1 0 0 0 1 4-4edge.dat
  [1,16,0,1,0,1,0,0,0,1,0,0,0,1, ldraw_lib__4_4edge()],
// 1 16 0 0 0 1 0 0 0 1 0 0 0 1 4-4disc.dat
  [1,16,0,0,0,1,0,0,0,1,0,0,0,1, ldraw_lib__4_4disc()],
// 1 16 0 0 0 1 0 0 0 1 0 0 0 1 4-4cyli.dat
  [1,16,0,0,0,1,0,0,0,1,0,0,0,1, ldraw_lib__4_4cyli()],
// 0
];
makepoly(ldraw_lib__4_4cylc(), line=0.2);
// main file
use <../lib.scad>
use <../p/4-4cylc.scad>
use <../p/4-4cyli.scad>
use <../p/4-4cylo.scad>
use <../p/4-4edge.scad>
use <../p/4-4ring1.scad>
use <../p/4-4ring2.scad>
use <../p/4-4ring3.scad>
use <../p/4-8sphe.scad>
use <../p/stud4a.scad>
function ldraw_lib__3957a() = [
// 0 Antenna  4H with Rounded Top
// 0 Name: 3957a.dat
// 0 Author: James Jessiman
// 0 !LDRAW_ORG Part UPDATE 2015-01
// 0 !LICENSE Licensed under CC BY 2.0 and CC BY 4.0 : see CAreadme.txt
// 
// 0 BFC CERTIFY CCW
  [0,"BFC","CERTIFY"],
  [0,"BFC","CCW"],
// 
// 0 !HISTORY 1998-06-20 [PTadmin] Official Update 1998-06
// 0 !HISTORY 2003-08-01 [PTadmin] Official Update 2003-02
// 0 !HISTORY 2003-08-06 [jriley] BFCed, added inner detail
// 0 !HISTORY 2003-12-19 [PTadmin] Official Update 2003-03
// 0 !HISTORY 2003-12-20 [Steffen] fixed BFC error
// 0 !HISTORY 2004-03-02 [PTadmin] Official Update 2004-01
// 0 !HISTORY 2007-06-30 [PTadmin] Header formatted for Contributor Agreement
// 0 !HISTORY 2008-07-01 [PTadmin] Official Update 2008-01
// 0 !HISTORY 2012-03-13 [PTadmin] Renamed from 3957
// 0 !HISTORY 2012-03-30 [PTadmin] Official Update 2012-01
// 0 !HISTORY 2015-02-10 [MagFors] Redesign without peghole.dat
// 0 !HISTORY 2015-10-11 [PTadmin] Official Update 2015-01
// 
// 
// 1 16 0 -84 0 4 0 0 0 -4 0 0 0 4 4-8sphe.dat
  [1,16,0,-84,0,4,0,0,0,-4,0,0,0,4, ldraw_lib__4_8sphe()],
// 1 16 0 4 0 1 0 0 0 -1 0 0 0 1 stud4a.dat
  [1,16,0,4,0,1,0,0,0,-1,0,0,0,1, ldraw_lib__stud4a()],
// 1 16 0 4 0 6 0 0 0 1 0 0 0 6 4-4edge.dat
  [1,16,0,4,0,6,0,0,0,1,0,0,0,6, ldraw_lib__4_4edge()],
// 1 16 0 4 0 3 0 0 0 -1 0 0 0 3 4-4ring1.dat
  [1,16,0,4,0,3,0,0,0,-1,0,0,0,3, ldraw_lib__4_4ring1()],
// 0 BFC INVERTNEXT
  [0,"BFC","INVERTNEXT"],
// 1 16 0 0 0 3 0 0 0 4 0 0 0 3 4-4cylc.dat
  [1,16,0,0,0,3,0,0,0,4,0,0,0,3, ldraw_lib__4_4cylc()],
// 1 16 0 0 0 8 0 0 0 1 0 0 0 8 4-4edge.dat
  [1,16,0,0,0,8,0,0,0,1,0,0,0,8, ldraw_lib__4_4edge()],
// 1 16 0 0 0 8 0 0 0 4 0 0 0 8 4-4cyli.dat
  [1,16,0,0,0,8,0,0,0,4,0,0,0,8, ldraw_lib__4_4cyli()],
// 1 16 0 0 0 2 0 0 0 1 0 0 0 2 4-4ring3.dat
  [1,16,0,0,0,2,0,0,0,1,0,0,0,2, ldraw_lib__4_4ring3()],
// 1 16 0 -4 0 6 0 0 0 4 0 0 0 6 4-4cylo.dat
  [1,16,0,-4,0,6,0,0,0,4,0,0,0,6, ldraw_lib__4_4cylo()],
// 1 16 0 -4 0 4 0 0 0 1 0 0 0 4 4-4edge.dat
  [1,16,0,-4,0,4,0,0,0,1,0,0,0,4, ldraw_lib__4_4edge()],
// 1 16 0 -4 0 2 0 0 0 1 0 0 0 2 4-4ring2.dat
  [1,16,0,-4,0,2,0,0,0,1,0,0,0,2, ldraw_lib__4_4ring2()],
// 1 16 0 -84 0 4 0 0 0 80 0 0 0 4 4-4cyli.dat
  [1,16,0,-84,0,4,0,0,0,80,0,0,0,4, ldraw_lib__4_4cyli()],
];
makepoly(ldraw_lib__3957a(), line=0.2);
